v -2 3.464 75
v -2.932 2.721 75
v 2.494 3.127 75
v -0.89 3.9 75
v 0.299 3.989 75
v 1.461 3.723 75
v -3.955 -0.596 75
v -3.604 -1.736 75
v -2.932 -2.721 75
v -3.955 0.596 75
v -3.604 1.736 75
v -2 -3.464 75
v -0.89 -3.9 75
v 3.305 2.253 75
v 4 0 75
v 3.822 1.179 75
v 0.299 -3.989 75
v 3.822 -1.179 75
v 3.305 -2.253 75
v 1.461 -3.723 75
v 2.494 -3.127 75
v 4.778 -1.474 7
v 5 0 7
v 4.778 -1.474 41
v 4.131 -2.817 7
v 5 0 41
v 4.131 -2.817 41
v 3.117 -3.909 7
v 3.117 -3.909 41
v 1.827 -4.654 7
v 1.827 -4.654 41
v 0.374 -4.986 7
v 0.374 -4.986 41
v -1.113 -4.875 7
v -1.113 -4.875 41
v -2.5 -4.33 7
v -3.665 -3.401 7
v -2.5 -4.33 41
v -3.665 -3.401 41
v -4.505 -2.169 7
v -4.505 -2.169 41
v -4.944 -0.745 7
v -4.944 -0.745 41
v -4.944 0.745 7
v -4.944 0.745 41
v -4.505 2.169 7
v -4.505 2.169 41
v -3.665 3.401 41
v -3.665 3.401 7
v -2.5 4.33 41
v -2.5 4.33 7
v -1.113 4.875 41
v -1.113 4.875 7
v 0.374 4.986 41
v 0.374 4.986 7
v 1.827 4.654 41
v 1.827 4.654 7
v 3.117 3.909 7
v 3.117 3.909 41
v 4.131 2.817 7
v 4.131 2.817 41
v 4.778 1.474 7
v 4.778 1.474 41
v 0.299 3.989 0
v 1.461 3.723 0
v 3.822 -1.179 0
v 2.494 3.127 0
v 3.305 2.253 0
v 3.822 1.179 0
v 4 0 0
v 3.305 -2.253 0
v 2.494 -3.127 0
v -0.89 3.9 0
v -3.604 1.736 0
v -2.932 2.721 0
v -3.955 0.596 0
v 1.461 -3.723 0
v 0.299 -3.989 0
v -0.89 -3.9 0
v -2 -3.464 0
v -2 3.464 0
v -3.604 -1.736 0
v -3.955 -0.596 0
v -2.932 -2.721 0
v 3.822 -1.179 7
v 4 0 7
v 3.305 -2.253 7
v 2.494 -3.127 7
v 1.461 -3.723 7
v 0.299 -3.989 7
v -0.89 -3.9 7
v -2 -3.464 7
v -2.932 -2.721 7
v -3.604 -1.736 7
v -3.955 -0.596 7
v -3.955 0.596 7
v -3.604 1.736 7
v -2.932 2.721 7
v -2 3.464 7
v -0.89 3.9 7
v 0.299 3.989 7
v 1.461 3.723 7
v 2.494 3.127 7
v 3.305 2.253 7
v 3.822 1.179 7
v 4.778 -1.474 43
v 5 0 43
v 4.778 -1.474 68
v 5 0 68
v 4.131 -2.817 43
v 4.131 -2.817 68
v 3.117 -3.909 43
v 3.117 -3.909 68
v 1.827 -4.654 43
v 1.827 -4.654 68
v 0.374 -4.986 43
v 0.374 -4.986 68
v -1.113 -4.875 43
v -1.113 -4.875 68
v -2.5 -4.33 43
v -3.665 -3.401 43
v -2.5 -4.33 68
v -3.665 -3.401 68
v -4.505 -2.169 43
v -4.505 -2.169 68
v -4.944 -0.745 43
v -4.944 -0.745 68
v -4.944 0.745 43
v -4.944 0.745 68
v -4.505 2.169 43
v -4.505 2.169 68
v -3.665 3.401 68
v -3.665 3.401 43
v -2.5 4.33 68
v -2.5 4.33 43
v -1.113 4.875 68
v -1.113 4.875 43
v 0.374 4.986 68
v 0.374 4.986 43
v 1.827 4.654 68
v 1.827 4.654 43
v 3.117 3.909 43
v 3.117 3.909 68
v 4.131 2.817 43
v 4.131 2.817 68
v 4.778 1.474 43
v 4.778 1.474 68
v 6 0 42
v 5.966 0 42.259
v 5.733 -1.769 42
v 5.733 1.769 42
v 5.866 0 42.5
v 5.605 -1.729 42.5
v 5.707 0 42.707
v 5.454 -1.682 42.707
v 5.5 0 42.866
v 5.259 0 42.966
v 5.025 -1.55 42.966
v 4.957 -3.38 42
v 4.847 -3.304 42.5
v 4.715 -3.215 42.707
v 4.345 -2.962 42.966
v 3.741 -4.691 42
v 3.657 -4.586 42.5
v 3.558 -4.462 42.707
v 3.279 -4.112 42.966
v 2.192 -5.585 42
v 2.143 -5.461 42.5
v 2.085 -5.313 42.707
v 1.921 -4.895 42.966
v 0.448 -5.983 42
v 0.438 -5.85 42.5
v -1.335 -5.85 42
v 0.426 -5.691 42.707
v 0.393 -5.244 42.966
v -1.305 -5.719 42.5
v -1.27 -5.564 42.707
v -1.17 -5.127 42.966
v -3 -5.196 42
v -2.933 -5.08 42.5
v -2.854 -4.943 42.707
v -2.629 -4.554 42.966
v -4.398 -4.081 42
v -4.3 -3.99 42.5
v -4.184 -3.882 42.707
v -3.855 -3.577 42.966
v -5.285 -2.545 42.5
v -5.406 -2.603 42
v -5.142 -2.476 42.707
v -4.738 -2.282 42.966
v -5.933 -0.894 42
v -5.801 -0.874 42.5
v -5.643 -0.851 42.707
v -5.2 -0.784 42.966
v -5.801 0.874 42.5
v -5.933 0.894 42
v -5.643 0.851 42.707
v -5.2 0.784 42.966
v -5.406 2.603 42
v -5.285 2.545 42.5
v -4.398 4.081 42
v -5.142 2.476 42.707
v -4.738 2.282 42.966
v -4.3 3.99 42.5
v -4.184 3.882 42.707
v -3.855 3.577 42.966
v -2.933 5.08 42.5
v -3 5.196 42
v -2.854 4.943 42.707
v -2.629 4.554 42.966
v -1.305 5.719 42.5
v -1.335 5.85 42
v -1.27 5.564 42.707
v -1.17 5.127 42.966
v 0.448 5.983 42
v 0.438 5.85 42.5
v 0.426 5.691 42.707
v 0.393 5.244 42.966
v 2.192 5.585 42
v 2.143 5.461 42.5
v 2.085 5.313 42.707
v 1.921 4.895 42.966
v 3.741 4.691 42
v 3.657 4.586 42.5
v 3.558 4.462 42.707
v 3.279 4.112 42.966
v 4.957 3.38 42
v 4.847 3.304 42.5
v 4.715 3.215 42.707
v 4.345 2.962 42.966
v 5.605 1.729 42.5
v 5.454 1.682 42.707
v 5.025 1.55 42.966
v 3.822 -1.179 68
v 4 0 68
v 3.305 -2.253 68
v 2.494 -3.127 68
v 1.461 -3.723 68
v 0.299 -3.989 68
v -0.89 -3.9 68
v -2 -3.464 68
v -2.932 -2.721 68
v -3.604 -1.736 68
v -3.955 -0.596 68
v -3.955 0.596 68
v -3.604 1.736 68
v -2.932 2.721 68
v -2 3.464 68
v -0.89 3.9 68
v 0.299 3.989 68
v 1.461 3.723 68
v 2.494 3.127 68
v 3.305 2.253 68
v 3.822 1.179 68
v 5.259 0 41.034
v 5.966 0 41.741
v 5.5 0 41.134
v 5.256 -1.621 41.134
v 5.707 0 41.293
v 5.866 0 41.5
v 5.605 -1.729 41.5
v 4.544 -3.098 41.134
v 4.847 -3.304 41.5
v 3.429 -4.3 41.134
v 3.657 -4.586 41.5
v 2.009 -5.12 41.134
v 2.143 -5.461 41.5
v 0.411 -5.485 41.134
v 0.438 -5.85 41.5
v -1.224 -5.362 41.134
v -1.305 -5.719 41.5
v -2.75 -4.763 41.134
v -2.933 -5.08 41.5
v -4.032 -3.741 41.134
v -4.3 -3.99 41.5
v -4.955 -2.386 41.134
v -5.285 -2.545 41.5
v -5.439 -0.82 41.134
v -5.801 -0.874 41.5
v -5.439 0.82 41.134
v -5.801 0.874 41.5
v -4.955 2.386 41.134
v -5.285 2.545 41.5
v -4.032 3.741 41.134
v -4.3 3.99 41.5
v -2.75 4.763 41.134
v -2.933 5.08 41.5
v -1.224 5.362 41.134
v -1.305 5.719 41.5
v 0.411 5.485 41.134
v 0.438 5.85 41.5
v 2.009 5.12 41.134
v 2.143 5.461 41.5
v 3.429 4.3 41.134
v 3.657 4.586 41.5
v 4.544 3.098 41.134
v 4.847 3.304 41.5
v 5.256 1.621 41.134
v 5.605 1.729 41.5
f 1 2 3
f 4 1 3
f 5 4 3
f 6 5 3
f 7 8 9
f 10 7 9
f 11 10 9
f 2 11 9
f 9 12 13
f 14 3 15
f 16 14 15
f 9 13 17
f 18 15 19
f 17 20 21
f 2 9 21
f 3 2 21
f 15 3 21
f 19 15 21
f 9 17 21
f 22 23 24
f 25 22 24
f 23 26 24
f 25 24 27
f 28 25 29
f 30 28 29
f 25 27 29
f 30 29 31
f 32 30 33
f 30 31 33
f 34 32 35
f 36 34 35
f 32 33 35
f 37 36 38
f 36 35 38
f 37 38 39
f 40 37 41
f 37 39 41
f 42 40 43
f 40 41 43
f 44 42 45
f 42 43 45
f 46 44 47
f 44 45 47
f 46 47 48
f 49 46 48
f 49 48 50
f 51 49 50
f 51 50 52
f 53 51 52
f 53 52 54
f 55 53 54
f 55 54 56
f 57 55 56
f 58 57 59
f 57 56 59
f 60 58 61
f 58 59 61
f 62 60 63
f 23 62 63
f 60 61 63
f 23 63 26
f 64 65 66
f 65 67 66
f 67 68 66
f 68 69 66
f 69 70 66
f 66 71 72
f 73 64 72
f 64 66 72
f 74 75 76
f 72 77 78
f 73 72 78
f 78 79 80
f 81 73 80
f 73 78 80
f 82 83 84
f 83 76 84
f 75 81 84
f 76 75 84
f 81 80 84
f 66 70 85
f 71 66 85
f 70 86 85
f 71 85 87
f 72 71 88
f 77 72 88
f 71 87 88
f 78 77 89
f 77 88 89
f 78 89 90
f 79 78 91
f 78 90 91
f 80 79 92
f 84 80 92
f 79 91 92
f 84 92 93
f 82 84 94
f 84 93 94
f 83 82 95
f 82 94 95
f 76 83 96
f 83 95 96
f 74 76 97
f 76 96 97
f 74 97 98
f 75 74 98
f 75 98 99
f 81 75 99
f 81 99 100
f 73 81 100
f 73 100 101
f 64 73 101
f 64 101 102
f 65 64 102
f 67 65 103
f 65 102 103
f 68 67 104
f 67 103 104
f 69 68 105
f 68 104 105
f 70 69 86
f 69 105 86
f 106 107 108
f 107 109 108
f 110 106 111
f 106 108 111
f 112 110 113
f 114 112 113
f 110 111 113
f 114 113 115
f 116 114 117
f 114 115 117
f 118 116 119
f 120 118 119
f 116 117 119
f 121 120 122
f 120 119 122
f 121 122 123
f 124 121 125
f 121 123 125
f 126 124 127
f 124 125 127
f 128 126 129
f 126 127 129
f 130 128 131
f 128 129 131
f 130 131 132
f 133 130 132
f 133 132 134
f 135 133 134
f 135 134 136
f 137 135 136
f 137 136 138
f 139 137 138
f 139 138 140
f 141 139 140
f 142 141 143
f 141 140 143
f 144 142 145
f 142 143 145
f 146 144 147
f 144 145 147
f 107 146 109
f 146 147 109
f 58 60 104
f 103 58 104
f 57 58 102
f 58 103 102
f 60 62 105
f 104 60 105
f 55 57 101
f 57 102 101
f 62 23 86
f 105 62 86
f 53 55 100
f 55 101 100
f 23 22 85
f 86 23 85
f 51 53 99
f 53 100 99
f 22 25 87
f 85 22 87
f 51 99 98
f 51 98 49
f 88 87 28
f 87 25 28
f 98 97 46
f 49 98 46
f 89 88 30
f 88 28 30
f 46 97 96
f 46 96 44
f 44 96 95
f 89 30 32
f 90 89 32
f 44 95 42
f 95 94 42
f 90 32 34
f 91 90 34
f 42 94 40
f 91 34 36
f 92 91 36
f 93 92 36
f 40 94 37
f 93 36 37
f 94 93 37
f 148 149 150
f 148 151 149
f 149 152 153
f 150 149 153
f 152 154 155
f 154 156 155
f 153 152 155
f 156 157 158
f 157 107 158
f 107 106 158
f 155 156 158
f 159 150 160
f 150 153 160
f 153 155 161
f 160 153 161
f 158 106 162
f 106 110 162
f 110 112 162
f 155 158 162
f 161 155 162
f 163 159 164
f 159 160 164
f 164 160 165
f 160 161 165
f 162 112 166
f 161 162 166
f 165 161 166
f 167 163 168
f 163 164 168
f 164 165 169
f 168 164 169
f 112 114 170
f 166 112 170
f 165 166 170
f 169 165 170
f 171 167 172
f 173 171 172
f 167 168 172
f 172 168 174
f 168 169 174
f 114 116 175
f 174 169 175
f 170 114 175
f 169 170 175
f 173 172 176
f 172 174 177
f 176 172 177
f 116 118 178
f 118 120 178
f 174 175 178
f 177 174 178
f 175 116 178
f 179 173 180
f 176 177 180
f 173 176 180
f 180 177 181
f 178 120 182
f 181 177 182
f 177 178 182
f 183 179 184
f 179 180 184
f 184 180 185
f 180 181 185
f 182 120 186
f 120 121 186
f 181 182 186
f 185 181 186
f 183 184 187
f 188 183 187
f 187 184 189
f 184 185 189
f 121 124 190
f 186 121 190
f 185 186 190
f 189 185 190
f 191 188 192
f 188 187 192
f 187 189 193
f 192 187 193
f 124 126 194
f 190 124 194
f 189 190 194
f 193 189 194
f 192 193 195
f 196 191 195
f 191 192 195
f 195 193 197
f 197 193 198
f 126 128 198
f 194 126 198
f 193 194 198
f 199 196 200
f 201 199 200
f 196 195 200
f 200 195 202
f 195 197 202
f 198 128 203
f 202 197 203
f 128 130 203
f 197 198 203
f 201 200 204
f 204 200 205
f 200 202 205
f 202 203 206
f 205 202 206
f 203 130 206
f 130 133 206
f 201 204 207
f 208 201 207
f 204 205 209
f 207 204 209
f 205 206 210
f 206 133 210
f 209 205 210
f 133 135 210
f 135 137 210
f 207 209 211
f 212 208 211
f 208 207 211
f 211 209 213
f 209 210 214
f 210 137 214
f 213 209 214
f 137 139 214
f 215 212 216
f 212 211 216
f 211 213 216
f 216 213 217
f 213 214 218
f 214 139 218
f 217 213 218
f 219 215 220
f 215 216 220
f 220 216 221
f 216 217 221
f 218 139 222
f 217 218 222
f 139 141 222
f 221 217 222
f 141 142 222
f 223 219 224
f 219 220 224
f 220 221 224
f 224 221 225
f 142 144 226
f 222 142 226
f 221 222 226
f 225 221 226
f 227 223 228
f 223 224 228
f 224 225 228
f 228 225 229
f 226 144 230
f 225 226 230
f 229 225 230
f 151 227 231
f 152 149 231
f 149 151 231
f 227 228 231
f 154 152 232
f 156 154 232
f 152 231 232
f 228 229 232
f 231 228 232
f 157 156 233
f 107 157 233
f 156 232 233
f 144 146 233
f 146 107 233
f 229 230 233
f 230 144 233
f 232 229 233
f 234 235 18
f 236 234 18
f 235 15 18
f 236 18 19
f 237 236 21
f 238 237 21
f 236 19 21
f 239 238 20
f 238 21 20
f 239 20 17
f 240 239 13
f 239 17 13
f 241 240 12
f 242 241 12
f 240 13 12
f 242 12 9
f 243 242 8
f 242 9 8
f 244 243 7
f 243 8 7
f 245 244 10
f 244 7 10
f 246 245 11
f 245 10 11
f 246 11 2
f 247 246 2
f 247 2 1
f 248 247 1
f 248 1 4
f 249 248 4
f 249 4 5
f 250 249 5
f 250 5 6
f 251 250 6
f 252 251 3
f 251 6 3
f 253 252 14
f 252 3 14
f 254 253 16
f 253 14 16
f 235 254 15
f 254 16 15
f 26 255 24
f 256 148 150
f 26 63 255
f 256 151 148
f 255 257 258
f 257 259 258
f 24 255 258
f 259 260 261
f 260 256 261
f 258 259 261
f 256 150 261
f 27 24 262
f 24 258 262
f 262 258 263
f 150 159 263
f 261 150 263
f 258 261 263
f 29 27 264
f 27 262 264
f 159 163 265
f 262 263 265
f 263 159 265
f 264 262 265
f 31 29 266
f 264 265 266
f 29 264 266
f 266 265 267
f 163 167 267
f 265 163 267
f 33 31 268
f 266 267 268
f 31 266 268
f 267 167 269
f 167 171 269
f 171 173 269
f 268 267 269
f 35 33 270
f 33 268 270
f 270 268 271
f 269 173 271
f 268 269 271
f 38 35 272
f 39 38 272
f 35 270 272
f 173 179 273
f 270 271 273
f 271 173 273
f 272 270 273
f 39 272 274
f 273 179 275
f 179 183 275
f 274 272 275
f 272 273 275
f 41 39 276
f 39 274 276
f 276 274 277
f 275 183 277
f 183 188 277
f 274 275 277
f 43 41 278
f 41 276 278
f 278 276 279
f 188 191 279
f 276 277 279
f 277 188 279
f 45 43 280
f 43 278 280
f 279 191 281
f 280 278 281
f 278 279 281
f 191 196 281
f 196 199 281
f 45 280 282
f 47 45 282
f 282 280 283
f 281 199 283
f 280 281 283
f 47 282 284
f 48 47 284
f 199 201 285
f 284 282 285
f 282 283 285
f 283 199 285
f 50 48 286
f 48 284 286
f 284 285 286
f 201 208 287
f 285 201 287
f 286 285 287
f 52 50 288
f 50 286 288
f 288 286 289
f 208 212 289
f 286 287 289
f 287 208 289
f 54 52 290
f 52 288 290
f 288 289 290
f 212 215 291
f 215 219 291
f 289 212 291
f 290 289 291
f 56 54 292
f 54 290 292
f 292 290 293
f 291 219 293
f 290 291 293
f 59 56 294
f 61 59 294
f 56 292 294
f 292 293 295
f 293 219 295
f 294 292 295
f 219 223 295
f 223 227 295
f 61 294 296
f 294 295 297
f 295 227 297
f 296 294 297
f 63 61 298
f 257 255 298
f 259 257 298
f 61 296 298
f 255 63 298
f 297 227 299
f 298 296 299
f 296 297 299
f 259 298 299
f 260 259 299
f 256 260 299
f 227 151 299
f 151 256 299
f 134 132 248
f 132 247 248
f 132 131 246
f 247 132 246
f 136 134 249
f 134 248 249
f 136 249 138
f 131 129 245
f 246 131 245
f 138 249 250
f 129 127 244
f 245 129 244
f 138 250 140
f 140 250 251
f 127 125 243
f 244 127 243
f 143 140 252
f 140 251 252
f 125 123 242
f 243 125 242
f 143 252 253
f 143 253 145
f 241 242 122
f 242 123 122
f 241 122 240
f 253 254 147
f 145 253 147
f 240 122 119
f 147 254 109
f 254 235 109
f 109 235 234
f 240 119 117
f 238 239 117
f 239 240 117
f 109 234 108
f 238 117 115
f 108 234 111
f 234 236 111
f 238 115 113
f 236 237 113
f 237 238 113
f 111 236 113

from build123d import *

# Parameters (mm, degrees)
F2_R = 0.99999


# Not quite as in the source:
# - a fillet or chamfer is up to 0.001 mm smaller than in the source, because OpenCascade refuses the exact size


with BuildPart() as f1:
    # F0 (on Front) → F1 (revolve)
    with BuildSketch(Plane.XZ):
        Polygon((4, 75), (0, 75), (0, 0), (4, 0), (4, 7), (5, 7), (5, 41), (6, 41), (6, 43), (5, 43), (5, 68), (4, 68), align=None)
    revolve(axis=Axis((0, 0, 37.5), (0, 0, -1)))

    # F2 (radius 1 in the source; OpenCascade refuses exactly that, so slightly less here)
    f2_edges = [f1.edges().sort_by_distance(p)[0] for p in [
        (-6, 0, 41),
        (-6, 0, 43),
        (6, 0, 42),
    ]]
    fillet(f2_edges, radius=F2_R)


solid = f1.part
